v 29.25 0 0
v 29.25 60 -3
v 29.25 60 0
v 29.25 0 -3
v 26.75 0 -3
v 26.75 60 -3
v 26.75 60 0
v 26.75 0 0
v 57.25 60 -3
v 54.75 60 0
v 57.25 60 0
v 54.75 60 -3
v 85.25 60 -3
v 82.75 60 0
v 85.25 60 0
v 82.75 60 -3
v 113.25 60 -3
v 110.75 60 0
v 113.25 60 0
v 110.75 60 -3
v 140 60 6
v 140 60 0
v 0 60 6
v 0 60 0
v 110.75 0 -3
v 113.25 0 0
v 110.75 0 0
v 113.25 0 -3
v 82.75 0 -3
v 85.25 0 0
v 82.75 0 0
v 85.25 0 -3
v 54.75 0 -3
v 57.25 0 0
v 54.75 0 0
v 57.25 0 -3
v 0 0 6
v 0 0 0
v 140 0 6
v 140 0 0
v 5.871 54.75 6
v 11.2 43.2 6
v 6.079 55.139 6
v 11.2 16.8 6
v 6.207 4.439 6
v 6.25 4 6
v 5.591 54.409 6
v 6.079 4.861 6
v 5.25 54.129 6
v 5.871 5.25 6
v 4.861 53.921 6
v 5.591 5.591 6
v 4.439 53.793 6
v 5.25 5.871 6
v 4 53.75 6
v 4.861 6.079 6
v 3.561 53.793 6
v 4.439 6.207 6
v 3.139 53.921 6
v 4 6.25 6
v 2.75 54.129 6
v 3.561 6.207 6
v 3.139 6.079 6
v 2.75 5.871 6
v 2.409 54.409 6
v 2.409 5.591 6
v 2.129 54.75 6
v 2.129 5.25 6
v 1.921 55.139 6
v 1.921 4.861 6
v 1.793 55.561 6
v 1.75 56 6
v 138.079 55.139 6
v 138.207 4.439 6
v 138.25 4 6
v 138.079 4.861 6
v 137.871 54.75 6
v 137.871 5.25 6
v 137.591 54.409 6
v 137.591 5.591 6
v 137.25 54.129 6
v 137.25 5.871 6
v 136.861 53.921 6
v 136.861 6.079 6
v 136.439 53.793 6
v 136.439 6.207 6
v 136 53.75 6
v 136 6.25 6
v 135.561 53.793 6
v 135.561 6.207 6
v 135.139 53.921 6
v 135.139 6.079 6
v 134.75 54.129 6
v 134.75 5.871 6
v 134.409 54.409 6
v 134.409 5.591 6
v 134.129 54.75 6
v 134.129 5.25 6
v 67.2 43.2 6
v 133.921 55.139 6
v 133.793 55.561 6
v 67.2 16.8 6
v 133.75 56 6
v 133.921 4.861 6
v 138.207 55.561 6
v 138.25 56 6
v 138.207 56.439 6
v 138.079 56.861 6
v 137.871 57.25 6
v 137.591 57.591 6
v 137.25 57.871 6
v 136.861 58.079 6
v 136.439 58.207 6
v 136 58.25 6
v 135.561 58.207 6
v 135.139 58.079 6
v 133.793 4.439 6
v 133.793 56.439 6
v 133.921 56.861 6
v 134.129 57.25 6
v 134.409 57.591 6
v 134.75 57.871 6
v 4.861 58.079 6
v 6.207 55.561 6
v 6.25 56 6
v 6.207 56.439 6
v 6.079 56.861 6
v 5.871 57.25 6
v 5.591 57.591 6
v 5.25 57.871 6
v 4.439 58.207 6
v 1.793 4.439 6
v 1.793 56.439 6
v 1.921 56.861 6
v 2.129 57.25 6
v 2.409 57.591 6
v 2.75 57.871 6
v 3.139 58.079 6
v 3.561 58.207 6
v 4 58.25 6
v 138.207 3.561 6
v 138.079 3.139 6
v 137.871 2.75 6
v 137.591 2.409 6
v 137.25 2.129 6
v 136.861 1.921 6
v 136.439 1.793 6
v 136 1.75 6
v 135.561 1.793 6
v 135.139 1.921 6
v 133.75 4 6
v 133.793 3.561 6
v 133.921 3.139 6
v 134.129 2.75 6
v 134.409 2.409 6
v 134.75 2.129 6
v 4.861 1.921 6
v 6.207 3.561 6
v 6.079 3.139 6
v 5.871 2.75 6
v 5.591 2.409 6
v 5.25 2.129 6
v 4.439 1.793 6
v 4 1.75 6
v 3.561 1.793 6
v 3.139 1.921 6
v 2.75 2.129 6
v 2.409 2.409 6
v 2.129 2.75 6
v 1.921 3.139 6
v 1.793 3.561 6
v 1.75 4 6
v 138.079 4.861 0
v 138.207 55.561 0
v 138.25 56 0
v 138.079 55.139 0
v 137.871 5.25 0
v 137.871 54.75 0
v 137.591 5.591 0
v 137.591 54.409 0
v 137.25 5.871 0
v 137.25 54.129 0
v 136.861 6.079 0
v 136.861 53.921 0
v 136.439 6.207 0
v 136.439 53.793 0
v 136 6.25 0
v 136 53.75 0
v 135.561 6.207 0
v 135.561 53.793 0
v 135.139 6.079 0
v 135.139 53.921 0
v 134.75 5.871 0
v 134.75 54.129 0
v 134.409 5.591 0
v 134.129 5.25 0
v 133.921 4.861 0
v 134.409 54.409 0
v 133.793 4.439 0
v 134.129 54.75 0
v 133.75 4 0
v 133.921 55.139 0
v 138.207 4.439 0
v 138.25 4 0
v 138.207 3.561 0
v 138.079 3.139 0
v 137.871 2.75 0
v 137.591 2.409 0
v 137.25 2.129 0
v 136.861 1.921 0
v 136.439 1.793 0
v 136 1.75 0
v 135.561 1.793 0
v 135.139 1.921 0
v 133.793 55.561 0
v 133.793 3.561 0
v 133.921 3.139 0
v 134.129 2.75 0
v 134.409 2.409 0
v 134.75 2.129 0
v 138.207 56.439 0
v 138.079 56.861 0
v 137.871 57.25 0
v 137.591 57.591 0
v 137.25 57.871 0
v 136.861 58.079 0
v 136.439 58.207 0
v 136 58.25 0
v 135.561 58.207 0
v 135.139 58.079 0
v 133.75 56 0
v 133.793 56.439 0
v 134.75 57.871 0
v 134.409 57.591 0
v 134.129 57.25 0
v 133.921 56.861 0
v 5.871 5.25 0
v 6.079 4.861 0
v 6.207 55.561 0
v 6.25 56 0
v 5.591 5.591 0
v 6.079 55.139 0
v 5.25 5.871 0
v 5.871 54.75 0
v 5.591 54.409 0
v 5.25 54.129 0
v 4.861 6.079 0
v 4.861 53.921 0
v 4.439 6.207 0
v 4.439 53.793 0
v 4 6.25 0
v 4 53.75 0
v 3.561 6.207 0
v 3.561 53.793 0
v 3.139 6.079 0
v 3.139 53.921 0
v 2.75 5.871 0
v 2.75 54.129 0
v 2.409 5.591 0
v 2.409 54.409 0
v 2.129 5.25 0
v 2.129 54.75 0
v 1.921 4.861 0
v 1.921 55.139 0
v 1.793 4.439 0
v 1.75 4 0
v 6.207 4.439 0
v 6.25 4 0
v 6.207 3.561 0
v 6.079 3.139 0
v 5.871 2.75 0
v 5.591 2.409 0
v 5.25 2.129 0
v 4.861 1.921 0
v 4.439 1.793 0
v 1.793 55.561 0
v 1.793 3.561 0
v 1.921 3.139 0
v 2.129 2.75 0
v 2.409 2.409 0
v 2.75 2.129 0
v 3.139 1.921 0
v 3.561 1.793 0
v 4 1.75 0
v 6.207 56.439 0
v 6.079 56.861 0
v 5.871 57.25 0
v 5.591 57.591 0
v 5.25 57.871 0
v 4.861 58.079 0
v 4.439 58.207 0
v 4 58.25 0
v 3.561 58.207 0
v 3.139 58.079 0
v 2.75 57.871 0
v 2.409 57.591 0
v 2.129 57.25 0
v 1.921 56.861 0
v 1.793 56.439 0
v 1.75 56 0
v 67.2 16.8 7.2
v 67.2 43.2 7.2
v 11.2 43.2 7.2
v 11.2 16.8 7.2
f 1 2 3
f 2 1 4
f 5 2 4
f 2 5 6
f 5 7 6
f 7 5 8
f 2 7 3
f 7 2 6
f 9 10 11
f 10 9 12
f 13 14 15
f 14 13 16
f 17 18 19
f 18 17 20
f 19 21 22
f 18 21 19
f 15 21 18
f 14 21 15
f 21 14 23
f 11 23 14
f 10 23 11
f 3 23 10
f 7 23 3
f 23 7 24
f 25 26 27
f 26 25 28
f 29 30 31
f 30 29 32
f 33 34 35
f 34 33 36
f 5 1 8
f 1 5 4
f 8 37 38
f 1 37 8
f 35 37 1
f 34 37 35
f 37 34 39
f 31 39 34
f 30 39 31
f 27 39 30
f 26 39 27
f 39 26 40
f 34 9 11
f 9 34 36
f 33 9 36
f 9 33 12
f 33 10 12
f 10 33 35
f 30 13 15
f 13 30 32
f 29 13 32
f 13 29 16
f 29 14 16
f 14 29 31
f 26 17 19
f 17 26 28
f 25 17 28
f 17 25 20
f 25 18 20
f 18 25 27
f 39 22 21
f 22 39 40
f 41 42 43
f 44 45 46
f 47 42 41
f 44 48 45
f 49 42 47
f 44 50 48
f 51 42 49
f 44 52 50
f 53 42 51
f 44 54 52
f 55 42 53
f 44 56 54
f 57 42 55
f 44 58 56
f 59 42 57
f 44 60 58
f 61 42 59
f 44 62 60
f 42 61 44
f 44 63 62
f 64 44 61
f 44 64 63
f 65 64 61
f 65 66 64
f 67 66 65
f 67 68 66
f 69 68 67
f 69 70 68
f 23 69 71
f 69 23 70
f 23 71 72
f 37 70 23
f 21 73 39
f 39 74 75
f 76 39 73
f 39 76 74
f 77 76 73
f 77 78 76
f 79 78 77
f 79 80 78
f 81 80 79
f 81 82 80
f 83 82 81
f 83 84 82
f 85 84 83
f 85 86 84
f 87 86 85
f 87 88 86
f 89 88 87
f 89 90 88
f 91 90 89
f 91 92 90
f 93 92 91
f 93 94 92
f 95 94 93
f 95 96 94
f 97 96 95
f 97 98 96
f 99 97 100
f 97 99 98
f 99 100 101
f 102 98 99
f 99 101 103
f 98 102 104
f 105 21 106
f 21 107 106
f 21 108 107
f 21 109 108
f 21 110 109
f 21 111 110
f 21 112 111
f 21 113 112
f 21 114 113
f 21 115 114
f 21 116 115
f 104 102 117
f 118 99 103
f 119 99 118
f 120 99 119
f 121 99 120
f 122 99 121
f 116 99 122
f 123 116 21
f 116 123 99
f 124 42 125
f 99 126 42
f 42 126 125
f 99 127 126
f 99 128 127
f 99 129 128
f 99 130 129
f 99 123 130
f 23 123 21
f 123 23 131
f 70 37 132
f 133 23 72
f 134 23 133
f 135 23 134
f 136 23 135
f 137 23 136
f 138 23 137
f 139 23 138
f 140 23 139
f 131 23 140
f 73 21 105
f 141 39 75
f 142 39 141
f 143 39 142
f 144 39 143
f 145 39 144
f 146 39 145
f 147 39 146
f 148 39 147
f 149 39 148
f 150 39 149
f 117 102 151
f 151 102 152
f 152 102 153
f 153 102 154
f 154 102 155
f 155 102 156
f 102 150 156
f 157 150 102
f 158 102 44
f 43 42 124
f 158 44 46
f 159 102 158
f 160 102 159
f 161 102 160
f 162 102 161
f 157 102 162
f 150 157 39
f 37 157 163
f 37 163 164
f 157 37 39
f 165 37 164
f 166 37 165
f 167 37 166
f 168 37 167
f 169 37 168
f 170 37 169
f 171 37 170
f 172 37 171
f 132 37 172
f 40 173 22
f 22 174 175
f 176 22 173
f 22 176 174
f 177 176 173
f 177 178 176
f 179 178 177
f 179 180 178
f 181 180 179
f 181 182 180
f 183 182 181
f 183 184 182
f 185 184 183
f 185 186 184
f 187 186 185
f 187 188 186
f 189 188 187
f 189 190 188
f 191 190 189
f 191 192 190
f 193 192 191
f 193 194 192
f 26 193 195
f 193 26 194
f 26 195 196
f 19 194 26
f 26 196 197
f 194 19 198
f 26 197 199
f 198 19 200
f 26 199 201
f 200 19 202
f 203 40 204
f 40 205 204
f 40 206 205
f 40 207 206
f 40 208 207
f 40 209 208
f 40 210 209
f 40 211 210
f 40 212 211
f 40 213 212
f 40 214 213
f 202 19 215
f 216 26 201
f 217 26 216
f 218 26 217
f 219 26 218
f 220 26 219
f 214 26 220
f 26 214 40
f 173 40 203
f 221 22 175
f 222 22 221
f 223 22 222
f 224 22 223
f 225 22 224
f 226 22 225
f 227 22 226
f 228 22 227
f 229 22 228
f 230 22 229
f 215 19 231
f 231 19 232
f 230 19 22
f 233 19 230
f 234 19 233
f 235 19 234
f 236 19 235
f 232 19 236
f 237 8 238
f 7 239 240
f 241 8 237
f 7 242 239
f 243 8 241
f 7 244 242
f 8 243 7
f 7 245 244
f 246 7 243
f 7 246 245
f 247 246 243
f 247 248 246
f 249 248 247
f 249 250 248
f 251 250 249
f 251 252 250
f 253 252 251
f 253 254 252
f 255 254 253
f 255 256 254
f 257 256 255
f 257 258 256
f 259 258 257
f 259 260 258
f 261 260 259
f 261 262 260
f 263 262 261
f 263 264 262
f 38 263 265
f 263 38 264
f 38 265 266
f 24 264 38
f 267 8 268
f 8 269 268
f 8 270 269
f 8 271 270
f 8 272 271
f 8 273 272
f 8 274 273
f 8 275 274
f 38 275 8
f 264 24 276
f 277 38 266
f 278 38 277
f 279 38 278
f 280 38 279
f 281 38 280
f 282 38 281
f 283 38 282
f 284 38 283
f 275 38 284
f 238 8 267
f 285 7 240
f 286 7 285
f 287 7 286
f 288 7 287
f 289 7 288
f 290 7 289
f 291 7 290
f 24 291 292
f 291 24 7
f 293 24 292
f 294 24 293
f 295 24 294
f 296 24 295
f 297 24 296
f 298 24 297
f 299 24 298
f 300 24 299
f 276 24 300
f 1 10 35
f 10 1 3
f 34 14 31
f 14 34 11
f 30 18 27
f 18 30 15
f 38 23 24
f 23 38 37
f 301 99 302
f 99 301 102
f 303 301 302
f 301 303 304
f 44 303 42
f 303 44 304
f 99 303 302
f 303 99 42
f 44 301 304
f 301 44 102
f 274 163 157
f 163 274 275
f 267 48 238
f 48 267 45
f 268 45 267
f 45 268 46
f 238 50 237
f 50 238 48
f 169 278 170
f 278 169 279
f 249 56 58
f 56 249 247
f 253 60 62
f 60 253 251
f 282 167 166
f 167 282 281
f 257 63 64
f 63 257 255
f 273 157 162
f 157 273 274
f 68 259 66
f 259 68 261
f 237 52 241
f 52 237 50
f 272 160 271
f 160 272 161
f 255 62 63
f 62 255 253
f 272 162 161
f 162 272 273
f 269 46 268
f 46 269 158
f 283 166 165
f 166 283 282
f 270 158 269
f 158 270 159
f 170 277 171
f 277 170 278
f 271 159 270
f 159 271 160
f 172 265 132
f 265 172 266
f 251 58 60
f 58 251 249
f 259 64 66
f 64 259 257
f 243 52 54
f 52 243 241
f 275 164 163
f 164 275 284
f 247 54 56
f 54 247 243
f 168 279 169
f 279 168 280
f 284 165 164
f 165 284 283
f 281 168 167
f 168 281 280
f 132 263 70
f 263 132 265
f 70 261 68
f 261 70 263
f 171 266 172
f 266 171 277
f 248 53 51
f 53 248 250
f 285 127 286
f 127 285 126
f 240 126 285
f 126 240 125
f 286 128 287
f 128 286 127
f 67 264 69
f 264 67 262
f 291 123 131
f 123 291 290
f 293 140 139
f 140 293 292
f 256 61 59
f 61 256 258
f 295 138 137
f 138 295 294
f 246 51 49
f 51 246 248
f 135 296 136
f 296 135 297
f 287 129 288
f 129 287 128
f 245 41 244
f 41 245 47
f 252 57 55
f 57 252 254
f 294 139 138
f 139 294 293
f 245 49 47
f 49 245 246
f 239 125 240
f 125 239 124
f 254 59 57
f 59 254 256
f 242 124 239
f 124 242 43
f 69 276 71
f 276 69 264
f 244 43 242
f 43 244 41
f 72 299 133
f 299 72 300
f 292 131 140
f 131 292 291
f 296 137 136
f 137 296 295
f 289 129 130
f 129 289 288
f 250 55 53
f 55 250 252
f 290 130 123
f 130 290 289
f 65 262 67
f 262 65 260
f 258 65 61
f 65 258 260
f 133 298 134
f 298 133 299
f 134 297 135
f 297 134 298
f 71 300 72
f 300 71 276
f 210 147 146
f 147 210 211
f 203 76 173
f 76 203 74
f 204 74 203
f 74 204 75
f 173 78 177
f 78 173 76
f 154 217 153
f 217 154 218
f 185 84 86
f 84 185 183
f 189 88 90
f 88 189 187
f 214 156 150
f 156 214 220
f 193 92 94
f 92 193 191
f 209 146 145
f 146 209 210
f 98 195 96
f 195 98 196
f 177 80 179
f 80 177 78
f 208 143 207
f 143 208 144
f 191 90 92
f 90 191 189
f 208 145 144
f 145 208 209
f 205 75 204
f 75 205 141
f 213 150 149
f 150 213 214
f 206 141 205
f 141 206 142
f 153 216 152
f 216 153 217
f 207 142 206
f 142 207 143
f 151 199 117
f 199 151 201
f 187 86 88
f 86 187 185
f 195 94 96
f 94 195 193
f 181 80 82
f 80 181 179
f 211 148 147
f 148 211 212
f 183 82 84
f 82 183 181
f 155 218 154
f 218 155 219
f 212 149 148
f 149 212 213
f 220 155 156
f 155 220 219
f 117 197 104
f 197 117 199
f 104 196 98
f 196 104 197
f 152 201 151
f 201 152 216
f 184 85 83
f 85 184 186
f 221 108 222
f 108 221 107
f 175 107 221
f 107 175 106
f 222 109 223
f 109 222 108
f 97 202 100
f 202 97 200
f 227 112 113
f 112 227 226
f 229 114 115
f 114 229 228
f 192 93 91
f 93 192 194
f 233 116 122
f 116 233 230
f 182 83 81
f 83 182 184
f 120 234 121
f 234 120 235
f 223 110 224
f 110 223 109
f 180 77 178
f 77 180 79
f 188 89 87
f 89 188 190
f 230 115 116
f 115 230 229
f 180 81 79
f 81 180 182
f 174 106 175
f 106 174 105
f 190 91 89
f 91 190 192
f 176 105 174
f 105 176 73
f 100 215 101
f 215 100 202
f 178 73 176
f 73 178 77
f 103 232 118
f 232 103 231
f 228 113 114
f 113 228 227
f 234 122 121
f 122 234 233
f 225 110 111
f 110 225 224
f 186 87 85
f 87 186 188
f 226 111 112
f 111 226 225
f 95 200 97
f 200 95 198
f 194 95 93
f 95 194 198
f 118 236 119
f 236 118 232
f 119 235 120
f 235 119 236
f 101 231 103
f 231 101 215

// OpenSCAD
$fn = 32;

// ----------------------------------------------------------------------
// Enclosure lid: 140 x 60 x 6 mm, 4 bolt holes
// ----------------------------------------------------------------------

// --- parameters (mm) ---
length = 140;             // lid length, X
width = 60;               // lid width, Y
plate_t = 6;              // lid plate thickness
bolt_d = 4.5;             // bolt clearance
boss_lip = 4;             // bolt hole inset from the corner
sink = 1;                 // overlap of the lip and ribs into the plate
rib_n = 4;                // stiffening ribs
rib_t = 2.5;              // rib thickness
rib_h = 4;                // rib height below the plate
label_h = 1.2;            // raised marking pad

module plate() {
  cube([length, width, plate_t]);
  /* stiffening ribs under the plate */
  for (i = [1 : rib_n]) translate([length * i / (rib_n + 1) - rib_t / 2, 0, -rib_h + sink]) cube([rib_t, width - 2 * 0, rib_h]);
  /* raised marking pad on top, sunk 1 mm into the plate */
  translate([length * 0.08, width * 0.28, plate_t - 1]) cube([length * 0.4, width * 0.44, label_h + 1]);
}

difference() {
  plate();
  /* bolt pattern matching the corner bosses */
  for (sx = [0, 1]) for (sy = [0, 1])
    translate([sx * (length - 2 * boss_lip) + boss_lip, sy * (width - 2 * boss_lip) + boss_lip, -0 - 1])
      cylinder(h = plate_t + 0 + 2, d = bolt_d);
}
